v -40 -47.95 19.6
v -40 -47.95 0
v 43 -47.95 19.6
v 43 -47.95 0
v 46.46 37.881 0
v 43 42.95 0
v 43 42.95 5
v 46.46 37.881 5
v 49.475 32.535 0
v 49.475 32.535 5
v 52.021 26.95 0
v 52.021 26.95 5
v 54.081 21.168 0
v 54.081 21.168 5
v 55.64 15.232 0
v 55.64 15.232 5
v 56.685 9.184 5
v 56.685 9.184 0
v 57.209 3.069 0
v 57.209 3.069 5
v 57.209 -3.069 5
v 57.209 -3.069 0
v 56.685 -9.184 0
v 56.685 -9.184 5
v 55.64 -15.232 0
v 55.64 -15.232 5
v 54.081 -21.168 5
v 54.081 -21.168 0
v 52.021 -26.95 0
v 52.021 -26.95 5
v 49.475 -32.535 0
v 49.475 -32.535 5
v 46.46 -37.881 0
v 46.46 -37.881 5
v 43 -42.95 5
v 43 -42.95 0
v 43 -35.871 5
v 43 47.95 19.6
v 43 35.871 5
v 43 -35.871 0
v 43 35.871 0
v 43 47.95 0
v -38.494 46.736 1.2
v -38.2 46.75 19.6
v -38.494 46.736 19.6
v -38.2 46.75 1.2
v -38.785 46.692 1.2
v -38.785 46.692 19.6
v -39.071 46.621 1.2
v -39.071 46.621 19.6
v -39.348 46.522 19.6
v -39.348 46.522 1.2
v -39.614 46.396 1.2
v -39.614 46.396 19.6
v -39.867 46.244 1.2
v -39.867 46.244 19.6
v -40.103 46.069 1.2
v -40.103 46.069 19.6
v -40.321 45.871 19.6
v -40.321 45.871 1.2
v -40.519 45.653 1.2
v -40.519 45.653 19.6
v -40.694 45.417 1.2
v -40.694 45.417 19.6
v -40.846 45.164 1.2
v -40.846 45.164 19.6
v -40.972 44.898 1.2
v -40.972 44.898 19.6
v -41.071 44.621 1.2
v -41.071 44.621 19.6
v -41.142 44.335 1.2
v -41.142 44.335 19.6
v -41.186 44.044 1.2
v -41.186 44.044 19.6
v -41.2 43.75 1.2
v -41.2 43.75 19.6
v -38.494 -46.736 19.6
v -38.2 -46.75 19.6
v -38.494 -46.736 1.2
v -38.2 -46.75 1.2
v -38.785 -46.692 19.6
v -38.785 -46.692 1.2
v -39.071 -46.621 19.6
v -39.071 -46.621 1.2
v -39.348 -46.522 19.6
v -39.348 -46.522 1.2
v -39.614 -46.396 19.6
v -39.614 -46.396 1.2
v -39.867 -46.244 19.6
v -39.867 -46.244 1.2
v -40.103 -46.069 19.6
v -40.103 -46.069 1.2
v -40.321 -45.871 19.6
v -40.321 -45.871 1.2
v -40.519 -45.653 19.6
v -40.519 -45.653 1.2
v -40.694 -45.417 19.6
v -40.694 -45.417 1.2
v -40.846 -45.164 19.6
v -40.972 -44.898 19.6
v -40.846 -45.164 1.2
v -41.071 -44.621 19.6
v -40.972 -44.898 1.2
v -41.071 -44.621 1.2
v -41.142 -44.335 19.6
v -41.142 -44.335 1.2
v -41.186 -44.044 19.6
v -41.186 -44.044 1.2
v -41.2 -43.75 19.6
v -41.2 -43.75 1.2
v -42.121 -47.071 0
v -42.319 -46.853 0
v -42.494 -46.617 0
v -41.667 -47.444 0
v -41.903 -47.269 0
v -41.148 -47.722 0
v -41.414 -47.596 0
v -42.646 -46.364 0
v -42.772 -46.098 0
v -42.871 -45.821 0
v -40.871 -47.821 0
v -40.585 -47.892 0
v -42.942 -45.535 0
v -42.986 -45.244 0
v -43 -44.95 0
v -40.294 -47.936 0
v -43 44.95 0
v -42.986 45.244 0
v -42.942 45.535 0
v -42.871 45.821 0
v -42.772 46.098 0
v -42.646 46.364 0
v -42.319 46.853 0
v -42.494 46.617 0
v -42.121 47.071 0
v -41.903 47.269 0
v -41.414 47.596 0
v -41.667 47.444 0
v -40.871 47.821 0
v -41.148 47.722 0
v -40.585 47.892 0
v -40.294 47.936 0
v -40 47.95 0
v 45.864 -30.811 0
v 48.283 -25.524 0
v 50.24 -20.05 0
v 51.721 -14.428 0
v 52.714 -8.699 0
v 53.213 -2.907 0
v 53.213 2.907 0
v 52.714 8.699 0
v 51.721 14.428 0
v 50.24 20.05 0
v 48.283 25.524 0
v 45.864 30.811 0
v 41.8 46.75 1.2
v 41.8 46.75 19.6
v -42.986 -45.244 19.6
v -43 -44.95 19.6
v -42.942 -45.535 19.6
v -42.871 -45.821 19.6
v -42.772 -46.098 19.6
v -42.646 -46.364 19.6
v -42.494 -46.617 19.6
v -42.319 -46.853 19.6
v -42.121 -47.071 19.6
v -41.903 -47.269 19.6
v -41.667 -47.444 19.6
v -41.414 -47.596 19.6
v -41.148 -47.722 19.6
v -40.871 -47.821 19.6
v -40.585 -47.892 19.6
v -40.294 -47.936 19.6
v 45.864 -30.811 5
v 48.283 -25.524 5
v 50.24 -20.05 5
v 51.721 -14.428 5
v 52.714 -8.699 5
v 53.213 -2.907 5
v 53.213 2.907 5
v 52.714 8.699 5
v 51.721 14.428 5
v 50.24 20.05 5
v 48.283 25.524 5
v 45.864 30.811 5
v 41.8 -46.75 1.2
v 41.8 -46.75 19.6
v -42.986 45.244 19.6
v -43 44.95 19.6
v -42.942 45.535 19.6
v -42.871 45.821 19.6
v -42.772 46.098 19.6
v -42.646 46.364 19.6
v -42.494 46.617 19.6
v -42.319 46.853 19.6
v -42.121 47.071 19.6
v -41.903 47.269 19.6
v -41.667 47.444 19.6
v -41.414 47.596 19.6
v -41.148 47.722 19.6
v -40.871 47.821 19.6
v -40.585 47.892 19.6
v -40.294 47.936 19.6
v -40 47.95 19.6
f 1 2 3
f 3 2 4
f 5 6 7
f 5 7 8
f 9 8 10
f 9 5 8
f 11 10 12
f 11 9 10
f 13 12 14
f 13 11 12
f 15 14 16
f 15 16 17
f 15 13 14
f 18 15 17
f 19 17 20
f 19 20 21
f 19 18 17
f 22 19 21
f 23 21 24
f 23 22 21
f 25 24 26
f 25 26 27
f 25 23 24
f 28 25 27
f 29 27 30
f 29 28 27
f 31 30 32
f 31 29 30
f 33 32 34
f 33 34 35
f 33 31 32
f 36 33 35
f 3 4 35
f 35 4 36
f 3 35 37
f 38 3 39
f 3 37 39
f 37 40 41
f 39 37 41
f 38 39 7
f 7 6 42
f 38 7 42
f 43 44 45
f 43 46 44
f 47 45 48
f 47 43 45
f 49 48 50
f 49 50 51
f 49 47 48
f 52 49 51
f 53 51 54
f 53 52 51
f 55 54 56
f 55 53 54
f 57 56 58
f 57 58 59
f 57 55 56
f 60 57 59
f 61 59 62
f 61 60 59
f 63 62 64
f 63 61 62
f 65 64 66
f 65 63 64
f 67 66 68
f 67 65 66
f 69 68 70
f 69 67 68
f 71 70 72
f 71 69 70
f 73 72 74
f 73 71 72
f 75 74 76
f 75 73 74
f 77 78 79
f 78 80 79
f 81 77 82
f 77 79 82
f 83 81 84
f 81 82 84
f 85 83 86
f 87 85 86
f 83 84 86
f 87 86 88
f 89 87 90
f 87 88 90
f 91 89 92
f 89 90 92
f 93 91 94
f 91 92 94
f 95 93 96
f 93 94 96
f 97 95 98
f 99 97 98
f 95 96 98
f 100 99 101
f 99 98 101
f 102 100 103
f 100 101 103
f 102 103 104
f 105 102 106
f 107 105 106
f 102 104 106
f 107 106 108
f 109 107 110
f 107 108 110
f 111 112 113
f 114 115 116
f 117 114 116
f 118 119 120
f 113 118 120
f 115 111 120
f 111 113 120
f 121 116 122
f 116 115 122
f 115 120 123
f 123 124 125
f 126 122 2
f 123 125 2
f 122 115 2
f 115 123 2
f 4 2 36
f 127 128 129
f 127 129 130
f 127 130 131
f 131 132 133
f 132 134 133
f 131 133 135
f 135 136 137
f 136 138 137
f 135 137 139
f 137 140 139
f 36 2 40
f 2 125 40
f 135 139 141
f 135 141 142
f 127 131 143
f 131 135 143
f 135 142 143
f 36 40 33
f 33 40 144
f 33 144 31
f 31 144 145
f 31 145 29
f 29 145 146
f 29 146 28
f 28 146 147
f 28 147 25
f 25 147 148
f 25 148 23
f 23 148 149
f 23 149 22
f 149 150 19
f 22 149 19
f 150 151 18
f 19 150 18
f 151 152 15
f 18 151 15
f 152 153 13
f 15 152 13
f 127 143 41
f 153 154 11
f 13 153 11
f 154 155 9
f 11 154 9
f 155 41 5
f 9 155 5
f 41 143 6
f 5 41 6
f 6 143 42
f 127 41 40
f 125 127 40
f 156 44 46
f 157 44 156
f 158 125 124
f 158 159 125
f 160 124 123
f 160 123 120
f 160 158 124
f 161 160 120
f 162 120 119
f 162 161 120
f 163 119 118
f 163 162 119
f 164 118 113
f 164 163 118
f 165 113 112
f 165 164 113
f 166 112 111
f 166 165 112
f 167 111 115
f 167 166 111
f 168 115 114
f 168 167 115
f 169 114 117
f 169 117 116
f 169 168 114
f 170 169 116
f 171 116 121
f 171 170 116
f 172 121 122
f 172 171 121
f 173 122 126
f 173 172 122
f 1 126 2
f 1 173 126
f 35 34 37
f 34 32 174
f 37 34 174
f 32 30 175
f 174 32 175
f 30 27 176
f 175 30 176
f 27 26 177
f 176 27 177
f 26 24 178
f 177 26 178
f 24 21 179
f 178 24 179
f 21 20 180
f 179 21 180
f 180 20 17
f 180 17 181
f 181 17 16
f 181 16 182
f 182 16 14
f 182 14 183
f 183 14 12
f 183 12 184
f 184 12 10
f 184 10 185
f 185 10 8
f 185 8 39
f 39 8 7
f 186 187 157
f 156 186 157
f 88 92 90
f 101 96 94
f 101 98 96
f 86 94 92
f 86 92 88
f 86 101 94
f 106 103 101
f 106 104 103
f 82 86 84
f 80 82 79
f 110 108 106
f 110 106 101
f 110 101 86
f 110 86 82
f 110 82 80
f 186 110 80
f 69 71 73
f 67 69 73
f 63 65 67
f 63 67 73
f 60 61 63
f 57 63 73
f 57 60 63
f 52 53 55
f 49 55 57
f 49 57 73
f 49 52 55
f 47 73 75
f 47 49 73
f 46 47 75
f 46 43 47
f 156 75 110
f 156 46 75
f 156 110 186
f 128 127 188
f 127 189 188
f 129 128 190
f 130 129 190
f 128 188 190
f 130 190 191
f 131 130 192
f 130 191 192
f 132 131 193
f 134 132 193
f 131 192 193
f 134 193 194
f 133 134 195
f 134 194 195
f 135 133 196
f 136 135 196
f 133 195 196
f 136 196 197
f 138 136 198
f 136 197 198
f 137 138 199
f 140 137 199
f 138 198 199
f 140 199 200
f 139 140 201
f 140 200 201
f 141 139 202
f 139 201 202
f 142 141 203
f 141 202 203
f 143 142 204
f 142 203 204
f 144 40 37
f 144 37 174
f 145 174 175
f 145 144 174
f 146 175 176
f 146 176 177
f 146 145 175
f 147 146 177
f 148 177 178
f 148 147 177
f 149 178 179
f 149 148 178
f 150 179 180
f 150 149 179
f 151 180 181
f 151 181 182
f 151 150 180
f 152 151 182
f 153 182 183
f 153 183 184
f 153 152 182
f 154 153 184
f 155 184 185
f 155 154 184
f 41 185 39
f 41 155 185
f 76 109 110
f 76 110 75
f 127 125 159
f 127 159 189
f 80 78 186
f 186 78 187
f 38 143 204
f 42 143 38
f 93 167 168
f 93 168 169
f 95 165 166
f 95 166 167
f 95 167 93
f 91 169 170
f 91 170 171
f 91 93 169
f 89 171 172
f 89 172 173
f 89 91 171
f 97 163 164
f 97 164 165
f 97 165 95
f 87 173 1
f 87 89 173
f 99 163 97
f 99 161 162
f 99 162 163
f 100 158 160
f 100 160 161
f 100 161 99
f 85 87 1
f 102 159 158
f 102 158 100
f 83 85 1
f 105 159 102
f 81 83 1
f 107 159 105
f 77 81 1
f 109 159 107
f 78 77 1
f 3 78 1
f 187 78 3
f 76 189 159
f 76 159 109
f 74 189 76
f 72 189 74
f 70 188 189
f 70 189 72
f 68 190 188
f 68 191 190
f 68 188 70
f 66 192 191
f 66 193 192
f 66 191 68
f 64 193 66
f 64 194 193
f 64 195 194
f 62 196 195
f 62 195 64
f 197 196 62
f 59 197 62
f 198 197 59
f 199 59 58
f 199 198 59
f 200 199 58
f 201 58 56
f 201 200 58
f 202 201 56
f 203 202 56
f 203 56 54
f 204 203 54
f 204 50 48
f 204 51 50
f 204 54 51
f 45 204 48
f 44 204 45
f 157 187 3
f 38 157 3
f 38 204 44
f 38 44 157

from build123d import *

# Parameters (mm, degrees)
SKETCH_1_W          = 86
SKETCH_1_H          = 95.9
EXTRUDE_1_DEPTH     = 19.6
EXTRUDE_2_DEPTH     = 5
SKETCH_3_W          = 83
SKETCH_3_H          = 93.5
CUT_EXTRUDE_1_DEPTH = 18.4
FILLET_1_R          = 3


with BuildPart() as part:
    # Эскиз1 → Бобышка-Вытянуть1 (new body)
    with BuildSketch(Plane.XY):
        Rectangle(SKETCH_1_W, SKETCH_1_H)
    extrude(amount=EXTRUDE_1_DEPTH)

    # Эскиз2 → Бобышка-Вытянуть2 (add)
    with BuildSketch(Plane(origin=(0, 0, 0), x_dir=(-1, 0, 0), z_dir=(0, 0, -1))):
        with BuildLine():
            Line((-43, 35.870635623), (-43, 42.95))
            ThreePointArc((-43, 42.95), (-57.275135929, 0), (-43, -42.95))
            Line((-43, -42.95), (-43, -35.870635623))
            ThreePointArc((-43, -35.870635623), (-53.275135929, 0), (-43, 35.870635623))
        make_face()
    extrude(amount=-EXTRUDE_2_DEPTH)

    # Эскиз3 → Вырез-Вытянуть1 (cut)
    with BuildSketch(Plane.XY.offset(19.6)):
        with Locations((0.3, 0)):
            Rectangle(SKETCH_3_W, SKETCH_3_H)
    extrude(amount=-CUT_EXTRUDE_1_DEPTH, mode=Mode.SUBTRACT)

    # Скругление1
    fillet_1_edges = [part.edges().sort_by_distance(p)[0] for p in [
        (-41.2, -46.75, 10.4),
        (-41.2, 46.75, 10.4),
        (-43, -47.95, 9.8),
        (-43, 47.95, 9.8),
    ]]
    fillet(fillet_1_edges, radius=FILLET_1_R)


solid = part.part
